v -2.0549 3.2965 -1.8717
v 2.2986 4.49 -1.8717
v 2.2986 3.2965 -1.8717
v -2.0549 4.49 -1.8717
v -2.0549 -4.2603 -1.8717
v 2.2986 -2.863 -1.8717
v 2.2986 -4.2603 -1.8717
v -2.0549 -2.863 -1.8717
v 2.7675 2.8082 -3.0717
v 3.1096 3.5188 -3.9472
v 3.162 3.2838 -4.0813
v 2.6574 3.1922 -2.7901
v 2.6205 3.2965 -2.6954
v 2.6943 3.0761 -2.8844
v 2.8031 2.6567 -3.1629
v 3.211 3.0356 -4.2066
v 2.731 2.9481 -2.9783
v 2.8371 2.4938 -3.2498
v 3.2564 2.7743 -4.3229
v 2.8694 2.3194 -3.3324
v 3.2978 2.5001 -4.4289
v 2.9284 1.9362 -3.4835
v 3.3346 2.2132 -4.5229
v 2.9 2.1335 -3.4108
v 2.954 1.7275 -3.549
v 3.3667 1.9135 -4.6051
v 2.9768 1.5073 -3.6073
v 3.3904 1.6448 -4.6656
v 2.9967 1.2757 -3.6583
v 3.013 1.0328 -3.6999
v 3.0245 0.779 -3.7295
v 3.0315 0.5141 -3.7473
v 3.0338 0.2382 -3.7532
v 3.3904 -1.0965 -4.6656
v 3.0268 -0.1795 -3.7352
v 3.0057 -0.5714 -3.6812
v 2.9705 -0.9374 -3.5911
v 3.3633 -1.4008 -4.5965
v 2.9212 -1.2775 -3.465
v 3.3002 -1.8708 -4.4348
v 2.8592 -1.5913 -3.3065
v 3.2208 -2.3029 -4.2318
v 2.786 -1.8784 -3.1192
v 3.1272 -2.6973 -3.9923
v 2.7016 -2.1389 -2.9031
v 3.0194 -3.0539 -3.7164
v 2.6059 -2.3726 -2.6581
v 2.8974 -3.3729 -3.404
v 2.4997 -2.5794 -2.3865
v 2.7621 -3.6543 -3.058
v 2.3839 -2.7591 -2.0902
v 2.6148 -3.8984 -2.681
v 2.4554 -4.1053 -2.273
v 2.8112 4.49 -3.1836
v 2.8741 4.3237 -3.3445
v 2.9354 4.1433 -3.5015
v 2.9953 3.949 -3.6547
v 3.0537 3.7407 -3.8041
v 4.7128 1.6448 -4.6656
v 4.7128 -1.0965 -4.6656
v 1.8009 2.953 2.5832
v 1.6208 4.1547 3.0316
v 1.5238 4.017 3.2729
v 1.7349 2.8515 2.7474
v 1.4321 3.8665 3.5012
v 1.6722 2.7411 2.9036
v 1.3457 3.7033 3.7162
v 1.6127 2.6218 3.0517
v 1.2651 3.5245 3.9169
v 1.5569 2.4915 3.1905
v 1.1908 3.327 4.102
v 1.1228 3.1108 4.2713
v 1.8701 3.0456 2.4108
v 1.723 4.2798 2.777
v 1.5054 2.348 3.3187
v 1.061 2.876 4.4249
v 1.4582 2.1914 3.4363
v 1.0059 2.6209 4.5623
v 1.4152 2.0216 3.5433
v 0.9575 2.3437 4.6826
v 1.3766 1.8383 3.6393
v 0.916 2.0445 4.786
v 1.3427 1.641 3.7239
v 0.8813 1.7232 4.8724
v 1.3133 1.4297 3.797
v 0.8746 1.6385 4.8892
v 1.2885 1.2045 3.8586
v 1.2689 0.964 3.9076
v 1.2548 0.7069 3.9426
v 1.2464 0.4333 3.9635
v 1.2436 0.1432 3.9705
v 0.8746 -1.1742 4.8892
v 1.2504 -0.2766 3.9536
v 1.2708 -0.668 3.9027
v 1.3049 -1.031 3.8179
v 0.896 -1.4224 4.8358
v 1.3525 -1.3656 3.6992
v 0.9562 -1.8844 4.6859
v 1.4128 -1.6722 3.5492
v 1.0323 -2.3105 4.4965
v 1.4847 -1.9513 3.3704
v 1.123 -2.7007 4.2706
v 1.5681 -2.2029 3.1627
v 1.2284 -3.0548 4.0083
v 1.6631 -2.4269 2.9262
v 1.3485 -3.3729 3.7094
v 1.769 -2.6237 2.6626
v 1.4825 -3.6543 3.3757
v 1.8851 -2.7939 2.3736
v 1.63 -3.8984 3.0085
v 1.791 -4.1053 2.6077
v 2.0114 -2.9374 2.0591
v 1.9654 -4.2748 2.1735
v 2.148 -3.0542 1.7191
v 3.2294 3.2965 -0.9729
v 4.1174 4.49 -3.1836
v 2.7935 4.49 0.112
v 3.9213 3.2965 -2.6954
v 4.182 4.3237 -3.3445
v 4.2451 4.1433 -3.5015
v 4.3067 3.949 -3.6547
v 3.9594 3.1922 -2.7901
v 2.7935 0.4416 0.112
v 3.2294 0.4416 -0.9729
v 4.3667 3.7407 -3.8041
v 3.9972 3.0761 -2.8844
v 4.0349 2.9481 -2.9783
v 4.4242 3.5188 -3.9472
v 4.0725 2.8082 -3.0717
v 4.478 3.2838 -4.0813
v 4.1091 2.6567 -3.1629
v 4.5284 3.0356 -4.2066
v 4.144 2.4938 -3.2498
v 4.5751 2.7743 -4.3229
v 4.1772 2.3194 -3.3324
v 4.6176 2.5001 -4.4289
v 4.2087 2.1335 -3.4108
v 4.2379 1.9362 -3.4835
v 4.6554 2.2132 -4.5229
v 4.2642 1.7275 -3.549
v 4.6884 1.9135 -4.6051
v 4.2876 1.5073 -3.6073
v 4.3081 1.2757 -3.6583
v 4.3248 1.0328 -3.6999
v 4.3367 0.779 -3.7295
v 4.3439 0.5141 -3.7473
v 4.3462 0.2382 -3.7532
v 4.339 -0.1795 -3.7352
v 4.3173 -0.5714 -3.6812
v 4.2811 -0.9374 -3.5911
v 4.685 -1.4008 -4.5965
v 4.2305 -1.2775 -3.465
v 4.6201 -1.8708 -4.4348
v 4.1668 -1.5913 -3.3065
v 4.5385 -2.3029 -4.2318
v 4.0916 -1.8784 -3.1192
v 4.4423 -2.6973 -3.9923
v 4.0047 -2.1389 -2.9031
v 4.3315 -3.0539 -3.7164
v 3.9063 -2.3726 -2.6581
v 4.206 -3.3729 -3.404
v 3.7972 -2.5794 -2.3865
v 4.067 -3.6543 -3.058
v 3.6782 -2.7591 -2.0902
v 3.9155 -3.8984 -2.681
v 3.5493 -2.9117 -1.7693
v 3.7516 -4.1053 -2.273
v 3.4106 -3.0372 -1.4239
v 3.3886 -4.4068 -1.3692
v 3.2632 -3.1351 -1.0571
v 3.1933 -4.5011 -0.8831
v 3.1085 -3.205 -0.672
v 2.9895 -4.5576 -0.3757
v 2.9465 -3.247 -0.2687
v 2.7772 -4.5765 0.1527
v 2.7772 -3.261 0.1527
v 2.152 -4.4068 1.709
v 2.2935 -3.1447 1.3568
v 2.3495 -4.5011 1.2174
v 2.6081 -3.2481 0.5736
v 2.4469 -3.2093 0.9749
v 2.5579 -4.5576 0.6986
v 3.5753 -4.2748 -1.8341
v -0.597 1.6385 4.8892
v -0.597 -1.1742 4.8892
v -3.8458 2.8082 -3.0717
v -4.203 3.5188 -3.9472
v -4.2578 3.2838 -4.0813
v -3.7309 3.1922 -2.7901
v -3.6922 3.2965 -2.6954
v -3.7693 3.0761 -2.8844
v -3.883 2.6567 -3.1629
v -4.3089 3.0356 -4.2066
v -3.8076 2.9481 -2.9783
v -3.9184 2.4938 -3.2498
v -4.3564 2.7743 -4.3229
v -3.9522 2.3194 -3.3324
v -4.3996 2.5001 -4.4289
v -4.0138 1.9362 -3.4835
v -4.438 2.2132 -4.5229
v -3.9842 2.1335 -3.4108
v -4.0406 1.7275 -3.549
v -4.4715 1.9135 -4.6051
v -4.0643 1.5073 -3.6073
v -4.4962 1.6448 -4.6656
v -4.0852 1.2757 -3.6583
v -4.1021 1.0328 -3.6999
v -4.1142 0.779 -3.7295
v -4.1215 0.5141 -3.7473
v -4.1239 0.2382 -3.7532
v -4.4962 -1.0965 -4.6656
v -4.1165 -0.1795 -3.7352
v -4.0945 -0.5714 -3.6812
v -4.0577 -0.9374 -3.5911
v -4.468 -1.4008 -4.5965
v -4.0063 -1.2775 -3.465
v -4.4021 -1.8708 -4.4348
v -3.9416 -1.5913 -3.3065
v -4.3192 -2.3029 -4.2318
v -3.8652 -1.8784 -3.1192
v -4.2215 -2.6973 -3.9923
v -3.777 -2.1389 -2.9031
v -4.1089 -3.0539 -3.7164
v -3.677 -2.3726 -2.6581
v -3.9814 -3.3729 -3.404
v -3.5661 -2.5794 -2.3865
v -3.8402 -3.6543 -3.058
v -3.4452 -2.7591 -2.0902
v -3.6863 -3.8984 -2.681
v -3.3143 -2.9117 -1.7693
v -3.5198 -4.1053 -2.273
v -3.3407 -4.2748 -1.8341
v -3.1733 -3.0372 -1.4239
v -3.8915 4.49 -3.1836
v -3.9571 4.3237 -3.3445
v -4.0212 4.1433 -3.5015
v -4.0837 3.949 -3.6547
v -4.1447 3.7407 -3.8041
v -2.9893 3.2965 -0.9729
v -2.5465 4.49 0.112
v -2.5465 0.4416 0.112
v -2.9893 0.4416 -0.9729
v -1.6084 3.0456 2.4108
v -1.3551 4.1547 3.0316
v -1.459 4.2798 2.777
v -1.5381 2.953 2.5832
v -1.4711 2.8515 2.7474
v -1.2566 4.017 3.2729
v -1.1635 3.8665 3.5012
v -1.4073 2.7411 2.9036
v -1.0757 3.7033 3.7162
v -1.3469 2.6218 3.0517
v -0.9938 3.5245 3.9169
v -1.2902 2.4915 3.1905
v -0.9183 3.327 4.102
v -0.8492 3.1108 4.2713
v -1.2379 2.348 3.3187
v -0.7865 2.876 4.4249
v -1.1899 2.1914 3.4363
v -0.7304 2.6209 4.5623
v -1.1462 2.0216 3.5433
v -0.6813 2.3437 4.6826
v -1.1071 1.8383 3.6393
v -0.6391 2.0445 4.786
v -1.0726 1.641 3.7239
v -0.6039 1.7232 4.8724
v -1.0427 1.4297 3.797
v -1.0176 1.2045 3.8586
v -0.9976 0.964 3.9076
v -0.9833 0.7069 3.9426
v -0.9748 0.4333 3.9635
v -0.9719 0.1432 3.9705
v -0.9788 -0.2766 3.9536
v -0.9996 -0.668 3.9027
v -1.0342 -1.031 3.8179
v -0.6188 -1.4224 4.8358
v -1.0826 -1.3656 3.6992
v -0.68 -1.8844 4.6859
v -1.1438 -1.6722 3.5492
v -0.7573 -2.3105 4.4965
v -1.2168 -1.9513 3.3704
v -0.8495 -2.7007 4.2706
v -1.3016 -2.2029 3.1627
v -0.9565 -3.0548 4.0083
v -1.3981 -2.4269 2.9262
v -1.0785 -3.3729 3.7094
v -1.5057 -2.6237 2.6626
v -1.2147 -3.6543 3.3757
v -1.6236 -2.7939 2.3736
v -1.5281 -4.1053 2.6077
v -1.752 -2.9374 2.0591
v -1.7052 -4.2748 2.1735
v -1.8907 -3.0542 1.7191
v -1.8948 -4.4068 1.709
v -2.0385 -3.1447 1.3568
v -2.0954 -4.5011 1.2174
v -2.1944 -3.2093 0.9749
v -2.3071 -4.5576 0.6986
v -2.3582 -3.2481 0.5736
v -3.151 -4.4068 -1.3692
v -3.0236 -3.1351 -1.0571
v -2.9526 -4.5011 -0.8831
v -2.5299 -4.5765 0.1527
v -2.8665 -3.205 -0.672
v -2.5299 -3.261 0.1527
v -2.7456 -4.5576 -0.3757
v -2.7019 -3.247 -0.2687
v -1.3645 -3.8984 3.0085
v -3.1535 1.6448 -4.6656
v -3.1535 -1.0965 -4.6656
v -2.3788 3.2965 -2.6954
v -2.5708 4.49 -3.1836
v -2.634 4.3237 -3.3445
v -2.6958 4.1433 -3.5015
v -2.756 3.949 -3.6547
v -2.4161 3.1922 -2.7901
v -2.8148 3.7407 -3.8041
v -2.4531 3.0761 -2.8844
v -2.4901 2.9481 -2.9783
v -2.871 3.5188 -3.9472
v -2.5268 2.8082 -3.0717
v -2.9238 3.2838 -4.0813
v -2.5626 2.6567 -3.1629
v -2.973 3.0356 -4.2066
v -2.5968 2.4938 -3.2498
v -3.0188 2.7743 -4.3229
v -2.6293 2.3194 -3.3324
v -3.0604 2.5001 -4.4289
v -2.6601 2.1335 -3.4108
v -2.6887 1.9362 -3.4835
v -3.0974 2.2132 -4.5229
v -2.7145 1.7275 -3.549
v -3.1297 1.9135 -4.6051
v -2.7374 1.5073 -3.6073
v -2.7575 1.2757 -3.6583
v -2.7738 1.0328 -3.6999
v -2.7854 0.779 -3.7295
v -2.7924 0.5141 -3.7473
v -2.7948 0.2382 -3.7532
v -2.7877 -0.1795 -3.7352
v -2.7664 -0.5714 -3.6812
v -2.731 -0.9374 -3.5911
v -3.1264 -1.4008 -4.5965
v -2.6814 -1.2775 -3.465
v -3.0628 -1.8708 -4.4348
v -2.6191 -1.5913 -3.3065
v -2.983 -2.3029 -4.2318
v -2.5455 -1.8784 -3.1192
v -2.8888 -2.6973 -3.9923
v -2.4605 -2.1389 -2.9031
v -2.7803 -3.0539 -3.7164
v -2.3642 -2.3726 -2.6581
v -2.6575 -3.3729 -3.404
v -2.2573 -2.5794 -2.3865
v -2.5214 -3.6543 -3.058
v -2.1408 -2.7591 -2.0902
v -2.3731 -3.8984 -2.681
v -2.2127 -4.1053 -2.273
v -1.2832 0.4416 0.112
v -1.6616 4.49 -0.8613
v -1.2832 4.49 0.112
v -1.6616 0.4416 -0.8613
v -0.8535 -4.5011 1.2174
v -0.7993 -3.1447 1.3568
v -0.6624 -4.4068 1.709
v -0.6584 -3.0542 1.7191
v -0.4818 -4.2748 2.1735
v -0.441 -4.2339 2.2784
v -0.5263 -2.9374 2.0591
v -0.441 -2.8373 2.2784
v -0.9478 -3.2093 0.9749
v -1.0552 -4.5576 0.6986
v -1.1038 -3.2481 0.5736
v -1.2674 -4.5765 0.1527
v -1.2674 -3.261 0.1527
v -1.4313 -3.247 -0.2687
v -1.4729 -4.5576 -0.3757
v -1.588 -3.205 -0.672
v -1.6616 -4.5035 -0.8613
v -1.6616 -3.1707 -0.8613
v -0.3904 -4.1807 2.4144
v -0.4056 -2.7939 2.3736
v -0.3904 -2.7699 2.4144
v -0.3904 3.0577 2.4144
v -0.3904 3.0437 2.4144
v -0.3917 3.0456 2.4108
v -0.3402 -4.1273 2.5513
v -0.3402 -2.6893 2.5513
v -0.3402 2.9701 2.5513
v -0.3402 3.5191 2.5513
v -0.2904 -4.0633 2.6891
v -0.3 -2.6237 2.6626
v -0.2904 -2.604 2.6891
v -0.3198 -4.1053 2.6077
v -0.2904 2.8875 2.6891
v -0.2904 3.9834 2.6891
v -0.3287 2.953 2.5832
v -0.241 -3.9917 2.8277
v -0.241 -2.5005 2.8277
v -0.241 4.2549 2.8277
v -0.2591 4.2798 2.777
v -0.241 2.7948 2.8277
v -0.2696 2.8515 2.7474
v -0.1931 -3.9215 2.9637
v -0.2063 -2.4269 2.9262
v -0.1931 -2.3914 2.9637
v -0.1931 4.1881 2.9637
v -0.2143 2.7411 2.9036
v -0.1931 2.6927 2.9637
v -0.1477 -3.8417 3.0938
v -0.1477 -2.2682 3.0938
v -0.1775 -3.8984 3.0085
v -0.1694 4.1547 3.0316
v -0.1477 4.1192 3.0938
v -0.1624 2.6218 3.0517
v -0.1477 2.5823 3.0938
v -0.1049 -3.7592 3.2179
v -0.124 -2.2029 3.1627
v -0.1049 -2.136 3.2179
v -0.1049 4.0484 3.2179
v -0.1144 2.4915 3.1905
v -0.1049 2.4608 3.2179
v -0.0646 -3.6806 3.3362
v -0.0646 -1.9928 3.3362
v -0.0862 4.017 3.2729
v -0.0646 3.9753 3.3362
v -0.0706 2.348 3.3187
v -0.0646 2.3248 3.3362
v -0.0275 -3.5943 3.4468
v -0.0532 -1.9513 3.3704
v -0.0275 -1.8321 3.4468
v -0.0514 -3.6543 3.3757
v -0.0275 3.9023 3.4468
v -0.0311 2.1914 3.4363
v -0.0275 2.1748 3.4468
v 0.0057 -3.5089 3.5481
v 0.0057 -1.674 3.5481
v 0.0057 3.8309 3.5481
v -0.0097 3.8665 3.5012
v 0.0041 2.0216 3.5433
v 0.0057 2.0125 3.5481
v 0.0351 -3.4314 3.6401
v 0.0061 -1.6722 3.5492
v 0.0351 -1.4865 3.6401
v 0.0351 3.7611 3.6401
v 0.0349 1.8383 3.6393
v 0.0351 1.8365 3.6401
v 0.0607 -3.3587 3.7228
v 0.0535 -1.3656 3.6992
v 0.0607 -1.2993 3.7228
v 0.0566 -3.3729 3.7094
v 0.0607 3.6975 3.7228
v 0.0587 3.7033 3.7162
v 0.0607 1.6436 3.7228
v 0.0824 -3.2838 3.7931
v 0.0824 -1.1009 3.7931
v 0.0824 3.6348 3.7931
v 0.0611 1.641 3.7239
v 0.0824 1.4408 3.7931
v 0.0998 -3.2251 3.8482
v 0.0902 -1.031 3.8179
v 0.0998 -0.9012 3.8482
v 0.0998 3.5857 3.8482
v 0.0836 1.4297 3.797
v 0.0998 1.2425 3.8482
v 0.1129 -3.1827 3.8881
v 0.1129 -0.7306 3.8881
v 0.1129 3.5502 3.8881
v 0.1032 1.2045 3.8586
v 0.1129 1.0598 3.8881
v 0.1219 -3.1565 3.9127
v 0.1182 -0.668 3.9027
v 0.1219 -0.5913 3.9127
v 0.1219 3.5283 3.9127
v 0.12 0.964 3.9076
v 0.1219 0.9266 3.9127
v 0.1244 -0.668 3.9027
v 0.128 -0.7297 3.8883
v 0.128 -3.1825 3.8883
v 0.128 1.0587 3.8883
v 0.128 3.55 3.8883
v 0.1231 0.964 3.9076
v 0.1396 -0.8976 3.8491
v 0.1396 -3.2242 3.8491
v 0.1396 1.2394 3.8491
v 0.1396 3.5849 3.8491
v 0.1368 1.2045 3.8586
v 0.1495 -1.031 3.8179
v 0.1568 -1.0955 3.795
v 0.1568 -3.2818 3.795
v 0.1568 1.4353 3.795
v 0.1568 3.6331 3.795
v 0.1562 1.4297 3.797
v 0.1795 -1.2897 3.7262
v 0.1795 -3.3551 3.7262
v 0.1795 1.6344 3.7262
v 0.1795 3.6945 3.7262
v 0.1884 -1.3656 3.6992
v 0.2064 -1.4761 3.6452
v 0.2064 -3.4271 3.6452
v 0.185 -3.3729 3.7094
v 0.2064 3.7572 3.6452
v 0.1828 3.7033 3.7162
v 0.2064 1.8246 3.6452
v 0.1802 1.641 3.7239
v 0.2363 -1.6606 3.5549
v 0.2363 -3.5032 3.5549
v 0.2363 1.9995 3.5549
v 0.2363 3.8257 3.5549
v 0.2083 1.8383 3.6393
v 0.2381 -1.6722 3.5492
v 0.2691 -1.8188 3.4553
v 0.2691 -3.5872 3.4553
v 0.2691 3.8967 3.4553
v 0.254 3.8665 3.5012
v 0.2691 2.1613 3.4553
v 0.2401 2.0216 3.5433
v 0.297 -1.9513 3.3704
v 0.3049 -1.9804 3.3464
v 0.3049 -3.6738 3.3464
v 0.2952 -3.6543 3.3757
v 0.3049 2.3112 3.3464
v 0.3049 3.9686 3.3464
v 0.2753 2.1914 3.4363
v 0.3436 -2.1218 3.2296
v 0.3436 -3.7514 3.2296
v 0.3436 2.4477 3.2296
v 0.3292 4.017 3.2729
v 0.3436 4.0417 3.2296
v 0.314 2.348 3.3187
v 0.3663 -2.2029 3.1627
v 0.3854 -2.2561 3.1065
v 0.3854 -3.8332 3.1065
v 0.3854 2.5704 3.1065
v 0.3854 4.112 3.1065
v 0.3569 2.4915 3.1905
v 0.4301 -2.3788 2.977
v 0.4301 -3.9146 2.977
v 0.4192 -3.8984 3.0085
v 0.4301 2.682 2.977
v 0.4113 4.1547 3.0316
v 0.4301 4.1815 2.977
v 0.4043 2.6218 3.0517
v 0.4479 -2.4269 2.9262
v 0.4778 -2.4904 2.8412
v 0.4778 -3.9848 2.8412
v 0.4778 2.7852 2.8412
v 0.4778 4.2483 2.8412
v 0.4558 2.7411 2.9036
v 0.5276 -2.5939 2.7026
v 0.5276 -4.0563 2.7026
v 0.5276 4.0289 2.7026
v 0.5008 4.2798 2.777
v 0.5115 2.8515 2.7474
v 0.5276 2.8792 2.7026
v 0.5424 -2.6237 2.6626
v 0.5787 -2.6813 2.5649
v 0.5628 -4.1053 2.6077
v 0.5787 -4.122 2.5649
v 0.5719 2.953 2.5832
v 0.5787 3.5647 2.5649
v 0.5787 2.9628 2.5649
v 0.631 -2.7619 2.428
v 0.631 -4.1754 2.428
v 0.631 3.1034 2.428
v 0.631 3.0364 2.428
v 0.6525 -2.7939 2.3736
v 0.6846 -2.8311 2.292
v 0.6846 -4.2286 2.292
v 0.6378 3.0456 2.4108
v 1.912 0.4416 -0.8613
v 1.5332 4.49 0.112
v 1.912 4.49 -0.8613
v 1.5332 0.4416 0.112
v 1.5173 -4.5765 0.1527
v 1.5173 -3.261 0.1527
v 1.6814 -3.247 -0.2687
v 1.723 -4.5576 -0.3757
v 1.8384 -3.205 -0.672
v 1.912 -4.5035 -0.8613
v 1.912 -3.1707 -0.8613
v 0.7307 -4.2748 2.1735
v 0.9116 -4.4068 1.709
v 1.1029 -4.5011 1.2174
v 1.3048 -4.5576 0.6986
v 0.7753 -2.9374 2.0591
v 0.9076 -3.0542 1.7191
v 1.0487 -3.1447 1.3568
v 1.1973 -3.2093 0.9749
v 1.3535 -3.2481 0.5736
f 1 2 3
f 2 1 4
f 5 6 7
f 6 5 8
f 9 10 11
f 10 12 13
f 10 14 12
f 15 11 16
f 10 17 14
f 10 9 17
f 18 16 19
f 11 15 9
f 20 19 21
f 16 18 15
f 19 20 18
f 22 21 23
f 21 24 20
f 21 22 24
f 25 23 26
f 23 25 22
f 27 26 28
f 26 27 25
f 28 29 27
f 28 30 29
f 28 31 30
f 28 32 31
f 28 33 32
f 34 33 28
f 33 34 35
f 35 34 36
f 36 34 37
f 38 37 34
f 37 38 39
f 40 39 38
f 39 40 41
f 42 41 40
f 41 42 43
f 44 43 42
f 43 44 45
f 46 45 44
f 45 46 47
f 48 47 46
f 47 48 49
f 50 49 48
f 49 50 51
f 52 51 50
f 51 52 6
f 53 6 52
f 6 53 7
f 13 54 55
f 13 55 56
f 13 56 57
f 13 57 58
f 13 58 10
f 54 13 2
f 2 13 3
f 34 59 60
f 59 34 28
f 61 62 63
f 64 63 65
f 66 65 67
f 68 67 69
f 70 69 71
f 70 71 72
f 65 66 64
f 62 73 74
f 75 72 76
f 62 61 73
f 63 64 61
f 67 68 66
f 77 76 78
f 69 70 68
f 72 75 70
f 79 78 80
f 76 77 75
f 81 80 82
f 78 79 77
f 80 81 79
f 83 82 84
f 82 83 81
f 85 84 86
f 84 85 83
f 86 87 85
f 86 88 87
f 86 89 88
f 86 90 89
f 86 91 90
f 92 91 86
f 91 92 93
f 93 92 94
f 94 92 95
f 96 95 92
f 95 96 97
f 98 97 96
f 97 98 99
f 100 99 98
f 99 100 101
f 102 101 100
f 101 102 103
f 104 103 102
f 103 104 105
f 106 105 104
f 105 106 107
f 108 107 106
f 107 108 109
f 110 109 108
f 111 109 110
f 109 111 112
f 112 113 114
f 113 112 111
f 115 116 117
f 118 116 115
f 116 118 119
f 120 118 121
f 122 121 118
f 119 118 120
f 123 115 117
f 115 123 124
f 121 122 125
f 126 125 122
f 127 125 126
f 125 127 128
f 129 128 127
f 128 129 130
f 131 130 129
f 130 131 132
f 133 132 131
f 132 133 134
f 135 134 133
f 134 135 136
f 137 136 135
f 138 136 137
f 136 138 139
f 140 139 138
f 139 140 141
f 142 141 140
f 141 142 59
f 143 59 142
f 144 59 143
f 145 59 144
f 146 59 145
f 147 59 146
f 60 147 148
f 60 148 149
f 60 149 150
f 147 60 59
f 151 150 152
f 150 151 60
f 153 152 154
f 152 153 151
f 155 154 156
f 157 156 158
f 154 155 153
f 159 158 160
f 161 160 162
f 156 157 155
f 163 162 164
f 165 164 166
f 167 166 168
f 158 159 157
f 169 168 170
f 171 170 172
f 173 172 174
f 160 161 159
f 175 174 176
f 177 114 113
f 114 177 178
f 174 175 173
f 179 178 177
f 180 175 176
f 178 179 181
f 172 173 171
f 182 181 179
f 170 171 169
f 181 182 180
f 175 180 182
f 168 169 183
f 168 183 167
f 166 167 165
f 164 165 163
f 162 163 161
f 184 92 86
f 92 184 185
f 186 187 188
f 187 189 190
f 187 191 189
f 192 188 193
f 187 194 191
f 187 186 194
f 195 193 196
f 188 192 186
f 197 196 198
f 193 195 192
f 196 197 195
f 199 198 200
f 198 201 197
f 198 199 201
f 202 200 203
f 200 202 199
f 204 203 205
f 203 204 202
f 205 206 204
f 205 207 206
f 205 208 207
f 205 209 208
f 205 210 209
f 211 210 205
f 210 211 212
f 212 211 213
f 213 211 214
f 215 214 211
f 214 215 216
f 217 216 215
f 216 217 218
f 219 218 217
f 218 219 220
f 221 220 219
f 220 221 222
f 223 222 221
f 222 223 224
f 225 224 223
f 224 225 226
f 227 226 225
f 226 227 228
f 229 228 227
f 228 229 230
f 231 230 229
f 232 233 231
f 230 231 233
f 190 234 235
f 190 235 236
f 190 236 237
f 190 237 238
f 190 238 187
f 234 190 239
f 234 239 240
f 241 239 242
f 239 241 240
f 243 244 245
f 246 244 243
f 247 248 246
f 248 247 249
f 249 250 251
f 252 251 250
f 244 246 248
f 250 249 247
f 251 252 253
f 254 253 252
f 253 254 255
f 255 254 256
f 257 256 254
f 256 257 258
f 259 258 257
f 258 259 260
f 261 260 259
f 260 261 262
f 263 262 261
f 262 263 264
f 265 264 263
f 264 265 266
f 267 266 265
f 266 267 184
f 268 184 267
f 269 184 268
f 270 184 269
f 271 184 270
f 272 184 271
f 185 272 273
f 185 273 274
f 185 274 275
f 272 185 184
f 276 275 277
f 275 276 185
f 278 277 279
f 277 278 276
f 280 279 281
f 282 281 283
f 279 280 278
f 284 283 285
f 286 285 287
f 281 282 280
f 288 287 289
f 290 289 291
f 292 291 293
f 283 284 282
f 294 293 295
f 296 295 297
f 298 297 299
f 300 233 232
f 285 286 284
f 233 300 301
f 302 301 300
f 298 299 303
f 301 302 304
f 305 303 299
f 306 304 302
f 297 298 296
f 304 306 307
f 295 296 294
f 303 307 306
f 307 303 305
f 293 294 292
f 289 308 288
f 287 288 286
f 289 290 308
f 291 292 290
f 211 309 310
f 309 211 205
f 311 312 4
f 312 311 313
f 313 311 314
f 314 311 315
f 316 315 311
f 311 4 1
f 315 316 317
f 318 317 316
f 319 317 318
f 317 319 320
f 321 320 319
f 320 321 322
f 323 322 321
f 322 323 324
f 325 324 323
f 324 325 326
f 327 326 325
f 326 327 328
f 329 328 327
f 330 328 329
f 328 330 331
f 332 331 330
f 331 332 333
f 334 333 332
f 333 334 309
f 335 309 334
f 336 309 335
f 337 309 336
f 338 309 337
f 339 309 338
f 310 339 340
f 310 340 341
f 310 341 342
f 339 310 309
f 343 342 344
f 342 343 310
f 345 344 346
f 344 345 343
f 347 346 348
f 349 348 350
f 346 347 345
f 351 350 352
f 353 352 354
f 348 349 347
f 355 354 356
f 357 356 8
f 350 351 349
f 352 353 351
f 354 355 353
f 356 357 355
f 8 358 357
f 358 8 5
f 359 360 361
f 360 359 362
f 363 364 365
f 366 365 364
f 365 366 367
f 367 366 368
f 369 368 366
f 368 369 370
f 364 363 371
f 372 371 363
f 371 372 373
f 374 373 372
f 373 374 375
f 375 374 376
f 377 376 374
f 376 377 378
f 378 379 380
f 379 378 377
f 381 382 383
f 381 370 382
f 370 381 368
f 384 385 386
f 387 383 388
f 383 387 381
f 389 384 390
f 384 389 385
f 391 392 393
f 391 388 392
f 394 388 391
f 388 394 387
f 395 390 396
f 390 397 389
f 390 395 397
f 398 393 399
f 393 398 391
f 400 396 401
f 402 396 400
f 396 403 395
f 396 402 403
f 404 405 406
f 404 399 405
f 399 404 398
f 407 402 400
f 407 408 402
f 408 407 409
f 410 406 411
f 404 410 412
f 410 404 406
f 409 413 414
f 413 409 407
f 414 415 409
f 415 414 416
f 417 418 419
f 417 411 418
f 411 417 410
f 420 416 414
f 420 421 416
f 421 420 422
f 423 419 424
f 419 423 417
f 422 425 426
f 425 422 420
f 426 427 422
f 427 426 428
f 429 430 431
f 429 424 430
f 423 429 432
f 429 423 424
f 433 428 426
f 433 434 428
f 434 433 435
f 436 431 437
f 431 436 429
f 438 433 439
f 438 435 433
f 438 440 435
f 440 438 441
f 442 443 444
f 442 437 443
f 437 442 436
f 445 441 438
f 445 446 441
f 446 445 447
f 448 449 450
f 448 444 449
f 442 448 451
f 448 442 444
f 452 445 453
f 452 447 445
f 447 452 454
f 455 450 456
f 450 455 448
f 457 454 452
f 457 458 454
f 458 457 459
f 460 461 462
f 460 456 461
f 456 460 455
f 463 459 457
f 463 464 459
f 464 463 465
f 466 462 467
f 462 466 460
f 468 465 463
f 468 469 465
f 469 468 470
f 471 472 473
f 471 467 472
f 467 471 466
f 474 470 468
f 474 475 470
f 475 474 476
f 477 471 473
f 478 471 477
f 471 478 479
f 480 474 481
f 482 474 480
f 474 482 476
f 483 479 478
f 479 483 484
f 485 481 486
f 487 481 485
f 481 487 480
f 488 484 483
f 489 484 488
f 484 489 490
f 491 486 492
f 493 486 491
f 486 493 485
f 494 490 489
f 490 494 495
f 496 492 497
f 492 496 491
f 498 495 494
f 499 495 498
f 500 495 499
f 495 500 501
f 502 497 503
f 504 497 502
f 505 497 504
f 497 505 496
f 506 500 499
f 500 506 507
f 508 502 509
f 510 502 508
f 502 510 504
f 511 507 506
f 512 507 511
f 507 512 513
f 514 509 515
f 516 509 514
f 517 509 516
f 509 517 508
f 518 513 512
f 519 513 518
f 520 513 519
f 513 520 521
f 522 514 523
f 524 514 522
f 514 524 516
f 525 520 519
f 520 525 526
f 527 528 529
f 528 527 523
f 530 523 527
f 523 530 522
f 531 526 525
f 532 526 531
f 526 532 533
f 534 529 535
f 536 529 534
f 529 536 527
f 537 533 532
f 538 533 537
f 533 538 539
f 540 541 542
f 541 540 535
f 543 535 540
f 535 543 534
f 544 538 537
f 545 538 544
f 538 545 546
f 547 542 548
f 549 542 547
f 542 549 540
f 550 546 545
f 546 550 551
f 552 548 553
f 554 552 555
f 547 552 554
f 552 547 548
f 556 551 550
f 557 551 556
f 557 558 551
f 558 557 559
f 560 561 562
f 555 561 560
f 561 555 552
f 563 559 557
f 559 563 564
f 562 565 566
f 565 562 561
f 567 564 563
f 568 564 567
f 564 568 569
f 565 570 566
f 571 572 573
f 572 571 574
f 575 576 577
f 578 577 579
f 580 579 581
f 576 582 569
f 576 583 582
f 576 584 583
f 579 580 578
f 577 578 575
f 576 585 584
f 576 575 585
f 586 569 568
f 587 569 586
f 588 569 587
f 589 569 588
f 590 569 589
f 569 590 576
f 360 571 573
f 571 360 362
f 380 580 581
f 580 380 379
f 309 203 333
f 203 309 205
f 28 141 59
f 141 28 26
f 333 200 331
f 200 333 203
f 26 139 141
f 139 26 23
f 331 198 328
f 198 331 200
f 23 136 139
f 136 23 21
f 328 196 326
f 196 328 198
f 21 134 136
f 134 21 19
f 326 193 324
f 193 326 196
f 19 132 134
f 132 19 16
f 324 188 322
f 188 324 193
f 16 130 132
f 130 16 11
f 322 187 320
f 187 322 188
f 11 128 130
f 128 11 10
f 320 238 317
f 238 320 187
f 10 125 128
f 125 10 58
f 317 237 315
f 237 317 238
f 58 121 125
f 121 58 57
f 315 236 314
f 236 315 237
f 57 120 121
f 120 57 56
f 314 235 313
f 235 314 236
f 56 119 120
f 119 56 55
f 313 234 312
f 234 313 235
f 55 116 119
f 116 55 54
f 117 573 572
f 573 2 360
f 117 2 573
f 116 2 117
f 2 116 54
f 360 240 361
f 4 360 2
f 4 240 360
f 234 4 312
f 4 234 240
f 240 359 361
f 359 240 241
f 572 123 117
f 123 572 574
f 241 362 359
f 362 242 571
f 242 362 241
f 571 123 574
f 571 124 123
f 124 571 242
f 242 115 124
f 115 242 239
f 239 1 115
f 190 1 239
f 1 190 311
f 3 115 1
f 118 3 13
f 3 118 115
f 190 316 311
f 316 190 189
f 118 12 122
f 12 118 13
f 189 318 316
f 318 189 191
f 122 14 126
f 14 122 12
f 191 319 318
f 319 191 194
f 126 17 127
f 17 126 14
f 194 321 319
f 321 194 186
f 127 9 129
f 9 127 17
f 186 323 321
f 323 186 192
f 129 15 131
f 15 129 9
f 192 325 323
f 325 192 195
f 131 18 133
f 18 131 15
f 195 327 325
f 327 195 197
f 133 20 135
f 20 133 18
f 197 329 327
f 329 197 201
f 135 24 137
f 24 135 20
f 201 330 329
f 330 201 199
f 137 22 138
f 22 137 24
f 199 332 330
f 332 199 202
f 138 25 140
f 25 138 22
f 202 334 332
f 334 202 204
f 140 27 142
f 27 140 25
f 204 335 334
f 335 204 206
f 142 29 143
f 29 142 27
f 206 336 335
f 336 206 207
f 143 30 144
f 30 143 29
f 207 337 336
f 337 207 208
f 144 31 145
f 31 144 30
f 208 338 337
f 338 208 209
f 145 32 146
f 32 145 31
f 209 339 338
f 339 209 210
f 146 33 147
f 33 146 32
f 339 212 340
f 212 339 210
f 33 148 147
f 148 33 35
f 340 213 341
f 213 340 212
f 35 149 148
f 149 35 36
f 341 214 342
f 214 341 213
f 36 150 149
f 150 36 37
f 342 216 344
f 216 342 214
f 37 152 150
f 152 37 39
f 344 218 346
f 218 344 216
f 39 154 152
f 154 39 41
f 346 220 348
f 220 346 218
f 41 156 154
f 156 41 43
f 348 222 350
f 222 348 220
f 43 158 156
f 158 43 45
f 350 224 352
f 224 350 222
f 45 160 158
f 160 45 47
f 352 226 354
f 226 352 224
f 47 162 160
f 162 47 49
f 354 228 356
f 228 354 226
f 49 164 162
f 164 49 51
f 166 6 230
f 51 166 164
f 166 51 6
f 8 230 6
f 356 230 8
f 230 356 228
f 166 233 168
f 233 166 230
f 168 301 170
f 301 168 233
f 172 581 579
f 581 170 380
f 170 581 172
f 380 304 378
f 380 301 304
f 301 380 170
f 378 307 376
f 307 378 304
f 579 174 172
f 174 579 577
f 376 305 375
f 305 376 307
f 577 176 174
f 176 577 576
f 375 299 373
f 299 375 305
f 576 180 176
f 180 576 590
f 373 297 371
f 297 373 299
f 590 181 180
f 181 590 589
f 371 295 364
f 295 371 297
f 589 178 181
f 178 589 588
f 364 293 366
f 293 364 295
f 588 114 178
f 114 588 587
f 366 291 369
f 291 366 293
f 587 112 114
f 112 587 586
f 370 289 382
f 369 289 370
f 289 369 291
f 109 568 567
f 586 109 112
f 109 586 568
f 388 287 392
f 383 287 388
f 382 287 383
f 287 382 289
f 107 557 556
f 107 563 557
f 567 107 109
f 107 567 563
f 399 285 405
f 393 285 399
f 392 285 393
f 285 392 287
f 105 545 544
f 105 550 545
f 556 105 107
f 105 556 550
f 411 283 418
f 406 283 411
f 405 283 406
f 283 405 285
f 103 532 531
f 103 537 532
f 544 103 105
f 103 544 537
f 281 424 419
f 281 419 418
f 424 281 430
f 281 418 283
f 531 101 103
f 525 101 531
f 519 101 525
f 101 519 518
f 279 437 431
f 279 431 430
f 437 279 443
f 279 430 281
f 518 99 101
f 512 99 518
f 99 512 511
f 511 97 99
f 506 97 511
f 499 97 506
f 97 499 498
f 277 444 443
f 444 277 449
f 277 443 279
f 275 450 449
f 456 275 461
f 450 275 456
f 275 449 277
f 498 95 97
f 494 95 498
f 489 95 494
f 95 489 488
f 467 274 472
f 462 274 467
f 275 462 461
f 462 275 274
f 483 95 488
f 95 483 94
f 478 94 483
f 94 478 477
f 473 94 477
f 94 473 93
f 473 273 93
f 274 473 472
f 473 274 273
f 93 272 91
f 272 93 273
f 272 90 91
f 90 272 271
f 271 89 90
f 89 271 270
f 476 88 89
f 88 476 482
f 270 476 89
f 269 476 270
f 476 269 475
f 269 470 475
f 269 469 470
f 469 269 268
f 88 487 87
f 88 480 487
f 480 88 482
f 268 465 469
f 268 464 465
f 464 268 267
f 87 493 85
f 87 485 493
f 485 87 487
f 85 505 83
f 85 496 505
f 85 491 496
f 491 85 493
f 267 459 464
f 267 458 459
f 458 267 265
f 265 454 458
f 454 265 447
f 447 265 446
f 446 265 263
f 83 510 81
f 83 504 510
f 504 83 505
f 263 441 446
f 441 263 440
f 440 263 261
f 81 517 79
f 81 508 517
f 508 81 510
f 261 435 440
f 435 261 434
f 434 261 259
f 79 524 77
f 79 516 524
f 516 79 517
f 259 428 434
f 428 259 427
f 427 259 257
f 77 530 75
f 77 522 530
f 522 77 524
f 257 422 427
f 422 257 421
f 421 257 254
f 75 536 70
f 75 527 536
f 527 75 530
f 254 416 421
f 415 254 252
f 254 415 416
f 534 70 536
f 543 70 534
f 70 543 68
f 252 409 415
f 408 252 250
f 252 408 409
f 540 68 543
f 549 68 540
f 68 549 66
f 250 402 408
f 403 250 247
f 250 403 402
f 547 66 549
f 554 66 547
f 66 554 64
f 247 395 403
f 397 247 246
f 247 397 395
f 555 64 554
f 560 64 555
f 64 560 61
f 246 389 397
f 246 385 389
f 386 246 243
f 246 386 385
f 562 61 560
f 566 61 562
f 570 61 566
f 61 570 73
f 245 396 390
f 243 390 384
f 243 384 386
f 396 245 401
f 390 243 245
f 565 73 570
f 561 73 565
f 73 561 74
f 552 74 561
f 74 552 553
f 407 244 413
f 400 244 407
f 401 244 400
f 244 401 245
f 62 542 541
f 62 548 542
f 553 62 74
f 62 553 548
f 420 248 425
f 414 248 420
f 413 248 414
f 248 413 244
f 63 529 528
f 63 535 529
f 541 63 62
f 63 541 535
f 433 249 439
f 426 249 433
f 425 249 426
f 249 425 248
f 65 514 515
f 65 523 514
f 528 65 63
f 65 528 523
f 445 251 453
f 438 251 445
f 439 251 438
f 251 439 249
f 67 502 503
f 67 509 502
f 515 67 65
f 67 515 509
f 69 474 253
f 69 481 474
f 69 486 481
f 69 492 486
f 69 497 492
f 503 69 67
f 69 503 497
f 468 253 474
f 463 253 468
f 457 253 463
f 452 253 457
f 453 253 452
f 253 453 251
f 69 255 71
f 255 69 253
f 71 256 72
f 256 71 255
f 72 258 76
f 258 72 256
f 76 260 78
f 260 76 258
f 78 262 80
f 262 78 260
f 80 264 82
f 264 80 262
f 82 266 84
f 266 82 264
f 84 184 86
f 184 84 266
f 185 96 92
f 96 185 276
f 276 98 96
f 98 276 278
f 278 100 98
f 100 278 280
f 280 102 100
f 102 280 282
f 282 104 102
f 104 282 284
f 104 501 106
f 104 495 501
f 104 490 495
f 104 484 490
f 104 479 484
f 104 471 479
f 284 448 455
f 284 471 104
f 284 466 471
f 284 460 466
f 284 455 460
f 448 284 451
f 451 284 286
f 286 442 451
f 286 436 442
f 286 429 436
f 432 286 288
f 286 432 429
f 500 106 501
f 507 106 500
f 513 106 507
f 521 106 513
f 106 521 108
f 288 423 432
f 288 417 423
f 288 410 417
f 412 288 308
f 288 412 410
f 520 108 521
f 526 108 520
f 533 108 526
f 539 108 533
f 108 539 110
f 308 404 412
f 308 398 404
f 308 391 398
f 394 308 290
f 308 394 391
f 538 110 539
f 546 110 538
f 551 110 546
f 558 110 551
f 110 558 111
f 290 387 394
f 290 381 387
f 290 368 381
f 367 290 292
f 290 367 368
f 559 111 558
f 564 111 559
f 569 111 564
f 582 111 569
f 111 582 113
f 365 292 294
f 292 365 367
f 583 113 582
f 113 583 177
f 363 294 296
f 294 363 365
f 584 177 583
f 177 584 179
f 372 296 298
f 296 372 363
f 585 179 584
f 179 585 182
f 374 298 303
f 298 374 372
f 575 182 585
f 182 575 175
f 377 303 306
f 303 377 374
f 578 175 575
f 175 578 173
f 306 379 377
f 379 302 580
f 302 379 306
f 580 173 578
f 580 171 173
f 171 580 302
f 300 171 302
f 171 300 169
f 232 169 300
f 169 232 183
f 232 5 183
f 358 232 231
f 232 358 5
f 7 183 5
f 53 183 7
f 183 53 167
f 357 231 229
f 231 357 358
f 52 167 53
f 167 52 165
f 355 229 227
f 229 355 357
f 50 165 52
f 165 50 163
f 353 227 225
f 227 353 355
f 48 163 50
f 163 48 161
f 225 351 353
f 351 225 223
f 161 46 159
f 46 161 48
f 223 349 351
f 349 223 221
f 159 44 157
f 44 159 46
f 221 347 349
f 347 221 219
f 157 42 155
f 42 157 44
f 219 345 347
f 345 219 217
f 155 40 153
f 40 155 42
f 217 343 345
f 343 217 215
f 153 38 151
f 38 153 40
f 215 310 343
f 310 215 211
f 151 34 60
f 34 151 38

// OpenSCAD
module initials(a, b) {
    module letra(t) {
        h = 50;
        translate([0,0,-h/2])
        linear_extrude(height=h)
        text(t,
            halign="center",
            valign="center");
    }
    
    intersection() {
        rotate([90,0,0])
        letra(a);
        rotate([90,0,90])
        letra(b);
    }
}
initials("A", "G");
